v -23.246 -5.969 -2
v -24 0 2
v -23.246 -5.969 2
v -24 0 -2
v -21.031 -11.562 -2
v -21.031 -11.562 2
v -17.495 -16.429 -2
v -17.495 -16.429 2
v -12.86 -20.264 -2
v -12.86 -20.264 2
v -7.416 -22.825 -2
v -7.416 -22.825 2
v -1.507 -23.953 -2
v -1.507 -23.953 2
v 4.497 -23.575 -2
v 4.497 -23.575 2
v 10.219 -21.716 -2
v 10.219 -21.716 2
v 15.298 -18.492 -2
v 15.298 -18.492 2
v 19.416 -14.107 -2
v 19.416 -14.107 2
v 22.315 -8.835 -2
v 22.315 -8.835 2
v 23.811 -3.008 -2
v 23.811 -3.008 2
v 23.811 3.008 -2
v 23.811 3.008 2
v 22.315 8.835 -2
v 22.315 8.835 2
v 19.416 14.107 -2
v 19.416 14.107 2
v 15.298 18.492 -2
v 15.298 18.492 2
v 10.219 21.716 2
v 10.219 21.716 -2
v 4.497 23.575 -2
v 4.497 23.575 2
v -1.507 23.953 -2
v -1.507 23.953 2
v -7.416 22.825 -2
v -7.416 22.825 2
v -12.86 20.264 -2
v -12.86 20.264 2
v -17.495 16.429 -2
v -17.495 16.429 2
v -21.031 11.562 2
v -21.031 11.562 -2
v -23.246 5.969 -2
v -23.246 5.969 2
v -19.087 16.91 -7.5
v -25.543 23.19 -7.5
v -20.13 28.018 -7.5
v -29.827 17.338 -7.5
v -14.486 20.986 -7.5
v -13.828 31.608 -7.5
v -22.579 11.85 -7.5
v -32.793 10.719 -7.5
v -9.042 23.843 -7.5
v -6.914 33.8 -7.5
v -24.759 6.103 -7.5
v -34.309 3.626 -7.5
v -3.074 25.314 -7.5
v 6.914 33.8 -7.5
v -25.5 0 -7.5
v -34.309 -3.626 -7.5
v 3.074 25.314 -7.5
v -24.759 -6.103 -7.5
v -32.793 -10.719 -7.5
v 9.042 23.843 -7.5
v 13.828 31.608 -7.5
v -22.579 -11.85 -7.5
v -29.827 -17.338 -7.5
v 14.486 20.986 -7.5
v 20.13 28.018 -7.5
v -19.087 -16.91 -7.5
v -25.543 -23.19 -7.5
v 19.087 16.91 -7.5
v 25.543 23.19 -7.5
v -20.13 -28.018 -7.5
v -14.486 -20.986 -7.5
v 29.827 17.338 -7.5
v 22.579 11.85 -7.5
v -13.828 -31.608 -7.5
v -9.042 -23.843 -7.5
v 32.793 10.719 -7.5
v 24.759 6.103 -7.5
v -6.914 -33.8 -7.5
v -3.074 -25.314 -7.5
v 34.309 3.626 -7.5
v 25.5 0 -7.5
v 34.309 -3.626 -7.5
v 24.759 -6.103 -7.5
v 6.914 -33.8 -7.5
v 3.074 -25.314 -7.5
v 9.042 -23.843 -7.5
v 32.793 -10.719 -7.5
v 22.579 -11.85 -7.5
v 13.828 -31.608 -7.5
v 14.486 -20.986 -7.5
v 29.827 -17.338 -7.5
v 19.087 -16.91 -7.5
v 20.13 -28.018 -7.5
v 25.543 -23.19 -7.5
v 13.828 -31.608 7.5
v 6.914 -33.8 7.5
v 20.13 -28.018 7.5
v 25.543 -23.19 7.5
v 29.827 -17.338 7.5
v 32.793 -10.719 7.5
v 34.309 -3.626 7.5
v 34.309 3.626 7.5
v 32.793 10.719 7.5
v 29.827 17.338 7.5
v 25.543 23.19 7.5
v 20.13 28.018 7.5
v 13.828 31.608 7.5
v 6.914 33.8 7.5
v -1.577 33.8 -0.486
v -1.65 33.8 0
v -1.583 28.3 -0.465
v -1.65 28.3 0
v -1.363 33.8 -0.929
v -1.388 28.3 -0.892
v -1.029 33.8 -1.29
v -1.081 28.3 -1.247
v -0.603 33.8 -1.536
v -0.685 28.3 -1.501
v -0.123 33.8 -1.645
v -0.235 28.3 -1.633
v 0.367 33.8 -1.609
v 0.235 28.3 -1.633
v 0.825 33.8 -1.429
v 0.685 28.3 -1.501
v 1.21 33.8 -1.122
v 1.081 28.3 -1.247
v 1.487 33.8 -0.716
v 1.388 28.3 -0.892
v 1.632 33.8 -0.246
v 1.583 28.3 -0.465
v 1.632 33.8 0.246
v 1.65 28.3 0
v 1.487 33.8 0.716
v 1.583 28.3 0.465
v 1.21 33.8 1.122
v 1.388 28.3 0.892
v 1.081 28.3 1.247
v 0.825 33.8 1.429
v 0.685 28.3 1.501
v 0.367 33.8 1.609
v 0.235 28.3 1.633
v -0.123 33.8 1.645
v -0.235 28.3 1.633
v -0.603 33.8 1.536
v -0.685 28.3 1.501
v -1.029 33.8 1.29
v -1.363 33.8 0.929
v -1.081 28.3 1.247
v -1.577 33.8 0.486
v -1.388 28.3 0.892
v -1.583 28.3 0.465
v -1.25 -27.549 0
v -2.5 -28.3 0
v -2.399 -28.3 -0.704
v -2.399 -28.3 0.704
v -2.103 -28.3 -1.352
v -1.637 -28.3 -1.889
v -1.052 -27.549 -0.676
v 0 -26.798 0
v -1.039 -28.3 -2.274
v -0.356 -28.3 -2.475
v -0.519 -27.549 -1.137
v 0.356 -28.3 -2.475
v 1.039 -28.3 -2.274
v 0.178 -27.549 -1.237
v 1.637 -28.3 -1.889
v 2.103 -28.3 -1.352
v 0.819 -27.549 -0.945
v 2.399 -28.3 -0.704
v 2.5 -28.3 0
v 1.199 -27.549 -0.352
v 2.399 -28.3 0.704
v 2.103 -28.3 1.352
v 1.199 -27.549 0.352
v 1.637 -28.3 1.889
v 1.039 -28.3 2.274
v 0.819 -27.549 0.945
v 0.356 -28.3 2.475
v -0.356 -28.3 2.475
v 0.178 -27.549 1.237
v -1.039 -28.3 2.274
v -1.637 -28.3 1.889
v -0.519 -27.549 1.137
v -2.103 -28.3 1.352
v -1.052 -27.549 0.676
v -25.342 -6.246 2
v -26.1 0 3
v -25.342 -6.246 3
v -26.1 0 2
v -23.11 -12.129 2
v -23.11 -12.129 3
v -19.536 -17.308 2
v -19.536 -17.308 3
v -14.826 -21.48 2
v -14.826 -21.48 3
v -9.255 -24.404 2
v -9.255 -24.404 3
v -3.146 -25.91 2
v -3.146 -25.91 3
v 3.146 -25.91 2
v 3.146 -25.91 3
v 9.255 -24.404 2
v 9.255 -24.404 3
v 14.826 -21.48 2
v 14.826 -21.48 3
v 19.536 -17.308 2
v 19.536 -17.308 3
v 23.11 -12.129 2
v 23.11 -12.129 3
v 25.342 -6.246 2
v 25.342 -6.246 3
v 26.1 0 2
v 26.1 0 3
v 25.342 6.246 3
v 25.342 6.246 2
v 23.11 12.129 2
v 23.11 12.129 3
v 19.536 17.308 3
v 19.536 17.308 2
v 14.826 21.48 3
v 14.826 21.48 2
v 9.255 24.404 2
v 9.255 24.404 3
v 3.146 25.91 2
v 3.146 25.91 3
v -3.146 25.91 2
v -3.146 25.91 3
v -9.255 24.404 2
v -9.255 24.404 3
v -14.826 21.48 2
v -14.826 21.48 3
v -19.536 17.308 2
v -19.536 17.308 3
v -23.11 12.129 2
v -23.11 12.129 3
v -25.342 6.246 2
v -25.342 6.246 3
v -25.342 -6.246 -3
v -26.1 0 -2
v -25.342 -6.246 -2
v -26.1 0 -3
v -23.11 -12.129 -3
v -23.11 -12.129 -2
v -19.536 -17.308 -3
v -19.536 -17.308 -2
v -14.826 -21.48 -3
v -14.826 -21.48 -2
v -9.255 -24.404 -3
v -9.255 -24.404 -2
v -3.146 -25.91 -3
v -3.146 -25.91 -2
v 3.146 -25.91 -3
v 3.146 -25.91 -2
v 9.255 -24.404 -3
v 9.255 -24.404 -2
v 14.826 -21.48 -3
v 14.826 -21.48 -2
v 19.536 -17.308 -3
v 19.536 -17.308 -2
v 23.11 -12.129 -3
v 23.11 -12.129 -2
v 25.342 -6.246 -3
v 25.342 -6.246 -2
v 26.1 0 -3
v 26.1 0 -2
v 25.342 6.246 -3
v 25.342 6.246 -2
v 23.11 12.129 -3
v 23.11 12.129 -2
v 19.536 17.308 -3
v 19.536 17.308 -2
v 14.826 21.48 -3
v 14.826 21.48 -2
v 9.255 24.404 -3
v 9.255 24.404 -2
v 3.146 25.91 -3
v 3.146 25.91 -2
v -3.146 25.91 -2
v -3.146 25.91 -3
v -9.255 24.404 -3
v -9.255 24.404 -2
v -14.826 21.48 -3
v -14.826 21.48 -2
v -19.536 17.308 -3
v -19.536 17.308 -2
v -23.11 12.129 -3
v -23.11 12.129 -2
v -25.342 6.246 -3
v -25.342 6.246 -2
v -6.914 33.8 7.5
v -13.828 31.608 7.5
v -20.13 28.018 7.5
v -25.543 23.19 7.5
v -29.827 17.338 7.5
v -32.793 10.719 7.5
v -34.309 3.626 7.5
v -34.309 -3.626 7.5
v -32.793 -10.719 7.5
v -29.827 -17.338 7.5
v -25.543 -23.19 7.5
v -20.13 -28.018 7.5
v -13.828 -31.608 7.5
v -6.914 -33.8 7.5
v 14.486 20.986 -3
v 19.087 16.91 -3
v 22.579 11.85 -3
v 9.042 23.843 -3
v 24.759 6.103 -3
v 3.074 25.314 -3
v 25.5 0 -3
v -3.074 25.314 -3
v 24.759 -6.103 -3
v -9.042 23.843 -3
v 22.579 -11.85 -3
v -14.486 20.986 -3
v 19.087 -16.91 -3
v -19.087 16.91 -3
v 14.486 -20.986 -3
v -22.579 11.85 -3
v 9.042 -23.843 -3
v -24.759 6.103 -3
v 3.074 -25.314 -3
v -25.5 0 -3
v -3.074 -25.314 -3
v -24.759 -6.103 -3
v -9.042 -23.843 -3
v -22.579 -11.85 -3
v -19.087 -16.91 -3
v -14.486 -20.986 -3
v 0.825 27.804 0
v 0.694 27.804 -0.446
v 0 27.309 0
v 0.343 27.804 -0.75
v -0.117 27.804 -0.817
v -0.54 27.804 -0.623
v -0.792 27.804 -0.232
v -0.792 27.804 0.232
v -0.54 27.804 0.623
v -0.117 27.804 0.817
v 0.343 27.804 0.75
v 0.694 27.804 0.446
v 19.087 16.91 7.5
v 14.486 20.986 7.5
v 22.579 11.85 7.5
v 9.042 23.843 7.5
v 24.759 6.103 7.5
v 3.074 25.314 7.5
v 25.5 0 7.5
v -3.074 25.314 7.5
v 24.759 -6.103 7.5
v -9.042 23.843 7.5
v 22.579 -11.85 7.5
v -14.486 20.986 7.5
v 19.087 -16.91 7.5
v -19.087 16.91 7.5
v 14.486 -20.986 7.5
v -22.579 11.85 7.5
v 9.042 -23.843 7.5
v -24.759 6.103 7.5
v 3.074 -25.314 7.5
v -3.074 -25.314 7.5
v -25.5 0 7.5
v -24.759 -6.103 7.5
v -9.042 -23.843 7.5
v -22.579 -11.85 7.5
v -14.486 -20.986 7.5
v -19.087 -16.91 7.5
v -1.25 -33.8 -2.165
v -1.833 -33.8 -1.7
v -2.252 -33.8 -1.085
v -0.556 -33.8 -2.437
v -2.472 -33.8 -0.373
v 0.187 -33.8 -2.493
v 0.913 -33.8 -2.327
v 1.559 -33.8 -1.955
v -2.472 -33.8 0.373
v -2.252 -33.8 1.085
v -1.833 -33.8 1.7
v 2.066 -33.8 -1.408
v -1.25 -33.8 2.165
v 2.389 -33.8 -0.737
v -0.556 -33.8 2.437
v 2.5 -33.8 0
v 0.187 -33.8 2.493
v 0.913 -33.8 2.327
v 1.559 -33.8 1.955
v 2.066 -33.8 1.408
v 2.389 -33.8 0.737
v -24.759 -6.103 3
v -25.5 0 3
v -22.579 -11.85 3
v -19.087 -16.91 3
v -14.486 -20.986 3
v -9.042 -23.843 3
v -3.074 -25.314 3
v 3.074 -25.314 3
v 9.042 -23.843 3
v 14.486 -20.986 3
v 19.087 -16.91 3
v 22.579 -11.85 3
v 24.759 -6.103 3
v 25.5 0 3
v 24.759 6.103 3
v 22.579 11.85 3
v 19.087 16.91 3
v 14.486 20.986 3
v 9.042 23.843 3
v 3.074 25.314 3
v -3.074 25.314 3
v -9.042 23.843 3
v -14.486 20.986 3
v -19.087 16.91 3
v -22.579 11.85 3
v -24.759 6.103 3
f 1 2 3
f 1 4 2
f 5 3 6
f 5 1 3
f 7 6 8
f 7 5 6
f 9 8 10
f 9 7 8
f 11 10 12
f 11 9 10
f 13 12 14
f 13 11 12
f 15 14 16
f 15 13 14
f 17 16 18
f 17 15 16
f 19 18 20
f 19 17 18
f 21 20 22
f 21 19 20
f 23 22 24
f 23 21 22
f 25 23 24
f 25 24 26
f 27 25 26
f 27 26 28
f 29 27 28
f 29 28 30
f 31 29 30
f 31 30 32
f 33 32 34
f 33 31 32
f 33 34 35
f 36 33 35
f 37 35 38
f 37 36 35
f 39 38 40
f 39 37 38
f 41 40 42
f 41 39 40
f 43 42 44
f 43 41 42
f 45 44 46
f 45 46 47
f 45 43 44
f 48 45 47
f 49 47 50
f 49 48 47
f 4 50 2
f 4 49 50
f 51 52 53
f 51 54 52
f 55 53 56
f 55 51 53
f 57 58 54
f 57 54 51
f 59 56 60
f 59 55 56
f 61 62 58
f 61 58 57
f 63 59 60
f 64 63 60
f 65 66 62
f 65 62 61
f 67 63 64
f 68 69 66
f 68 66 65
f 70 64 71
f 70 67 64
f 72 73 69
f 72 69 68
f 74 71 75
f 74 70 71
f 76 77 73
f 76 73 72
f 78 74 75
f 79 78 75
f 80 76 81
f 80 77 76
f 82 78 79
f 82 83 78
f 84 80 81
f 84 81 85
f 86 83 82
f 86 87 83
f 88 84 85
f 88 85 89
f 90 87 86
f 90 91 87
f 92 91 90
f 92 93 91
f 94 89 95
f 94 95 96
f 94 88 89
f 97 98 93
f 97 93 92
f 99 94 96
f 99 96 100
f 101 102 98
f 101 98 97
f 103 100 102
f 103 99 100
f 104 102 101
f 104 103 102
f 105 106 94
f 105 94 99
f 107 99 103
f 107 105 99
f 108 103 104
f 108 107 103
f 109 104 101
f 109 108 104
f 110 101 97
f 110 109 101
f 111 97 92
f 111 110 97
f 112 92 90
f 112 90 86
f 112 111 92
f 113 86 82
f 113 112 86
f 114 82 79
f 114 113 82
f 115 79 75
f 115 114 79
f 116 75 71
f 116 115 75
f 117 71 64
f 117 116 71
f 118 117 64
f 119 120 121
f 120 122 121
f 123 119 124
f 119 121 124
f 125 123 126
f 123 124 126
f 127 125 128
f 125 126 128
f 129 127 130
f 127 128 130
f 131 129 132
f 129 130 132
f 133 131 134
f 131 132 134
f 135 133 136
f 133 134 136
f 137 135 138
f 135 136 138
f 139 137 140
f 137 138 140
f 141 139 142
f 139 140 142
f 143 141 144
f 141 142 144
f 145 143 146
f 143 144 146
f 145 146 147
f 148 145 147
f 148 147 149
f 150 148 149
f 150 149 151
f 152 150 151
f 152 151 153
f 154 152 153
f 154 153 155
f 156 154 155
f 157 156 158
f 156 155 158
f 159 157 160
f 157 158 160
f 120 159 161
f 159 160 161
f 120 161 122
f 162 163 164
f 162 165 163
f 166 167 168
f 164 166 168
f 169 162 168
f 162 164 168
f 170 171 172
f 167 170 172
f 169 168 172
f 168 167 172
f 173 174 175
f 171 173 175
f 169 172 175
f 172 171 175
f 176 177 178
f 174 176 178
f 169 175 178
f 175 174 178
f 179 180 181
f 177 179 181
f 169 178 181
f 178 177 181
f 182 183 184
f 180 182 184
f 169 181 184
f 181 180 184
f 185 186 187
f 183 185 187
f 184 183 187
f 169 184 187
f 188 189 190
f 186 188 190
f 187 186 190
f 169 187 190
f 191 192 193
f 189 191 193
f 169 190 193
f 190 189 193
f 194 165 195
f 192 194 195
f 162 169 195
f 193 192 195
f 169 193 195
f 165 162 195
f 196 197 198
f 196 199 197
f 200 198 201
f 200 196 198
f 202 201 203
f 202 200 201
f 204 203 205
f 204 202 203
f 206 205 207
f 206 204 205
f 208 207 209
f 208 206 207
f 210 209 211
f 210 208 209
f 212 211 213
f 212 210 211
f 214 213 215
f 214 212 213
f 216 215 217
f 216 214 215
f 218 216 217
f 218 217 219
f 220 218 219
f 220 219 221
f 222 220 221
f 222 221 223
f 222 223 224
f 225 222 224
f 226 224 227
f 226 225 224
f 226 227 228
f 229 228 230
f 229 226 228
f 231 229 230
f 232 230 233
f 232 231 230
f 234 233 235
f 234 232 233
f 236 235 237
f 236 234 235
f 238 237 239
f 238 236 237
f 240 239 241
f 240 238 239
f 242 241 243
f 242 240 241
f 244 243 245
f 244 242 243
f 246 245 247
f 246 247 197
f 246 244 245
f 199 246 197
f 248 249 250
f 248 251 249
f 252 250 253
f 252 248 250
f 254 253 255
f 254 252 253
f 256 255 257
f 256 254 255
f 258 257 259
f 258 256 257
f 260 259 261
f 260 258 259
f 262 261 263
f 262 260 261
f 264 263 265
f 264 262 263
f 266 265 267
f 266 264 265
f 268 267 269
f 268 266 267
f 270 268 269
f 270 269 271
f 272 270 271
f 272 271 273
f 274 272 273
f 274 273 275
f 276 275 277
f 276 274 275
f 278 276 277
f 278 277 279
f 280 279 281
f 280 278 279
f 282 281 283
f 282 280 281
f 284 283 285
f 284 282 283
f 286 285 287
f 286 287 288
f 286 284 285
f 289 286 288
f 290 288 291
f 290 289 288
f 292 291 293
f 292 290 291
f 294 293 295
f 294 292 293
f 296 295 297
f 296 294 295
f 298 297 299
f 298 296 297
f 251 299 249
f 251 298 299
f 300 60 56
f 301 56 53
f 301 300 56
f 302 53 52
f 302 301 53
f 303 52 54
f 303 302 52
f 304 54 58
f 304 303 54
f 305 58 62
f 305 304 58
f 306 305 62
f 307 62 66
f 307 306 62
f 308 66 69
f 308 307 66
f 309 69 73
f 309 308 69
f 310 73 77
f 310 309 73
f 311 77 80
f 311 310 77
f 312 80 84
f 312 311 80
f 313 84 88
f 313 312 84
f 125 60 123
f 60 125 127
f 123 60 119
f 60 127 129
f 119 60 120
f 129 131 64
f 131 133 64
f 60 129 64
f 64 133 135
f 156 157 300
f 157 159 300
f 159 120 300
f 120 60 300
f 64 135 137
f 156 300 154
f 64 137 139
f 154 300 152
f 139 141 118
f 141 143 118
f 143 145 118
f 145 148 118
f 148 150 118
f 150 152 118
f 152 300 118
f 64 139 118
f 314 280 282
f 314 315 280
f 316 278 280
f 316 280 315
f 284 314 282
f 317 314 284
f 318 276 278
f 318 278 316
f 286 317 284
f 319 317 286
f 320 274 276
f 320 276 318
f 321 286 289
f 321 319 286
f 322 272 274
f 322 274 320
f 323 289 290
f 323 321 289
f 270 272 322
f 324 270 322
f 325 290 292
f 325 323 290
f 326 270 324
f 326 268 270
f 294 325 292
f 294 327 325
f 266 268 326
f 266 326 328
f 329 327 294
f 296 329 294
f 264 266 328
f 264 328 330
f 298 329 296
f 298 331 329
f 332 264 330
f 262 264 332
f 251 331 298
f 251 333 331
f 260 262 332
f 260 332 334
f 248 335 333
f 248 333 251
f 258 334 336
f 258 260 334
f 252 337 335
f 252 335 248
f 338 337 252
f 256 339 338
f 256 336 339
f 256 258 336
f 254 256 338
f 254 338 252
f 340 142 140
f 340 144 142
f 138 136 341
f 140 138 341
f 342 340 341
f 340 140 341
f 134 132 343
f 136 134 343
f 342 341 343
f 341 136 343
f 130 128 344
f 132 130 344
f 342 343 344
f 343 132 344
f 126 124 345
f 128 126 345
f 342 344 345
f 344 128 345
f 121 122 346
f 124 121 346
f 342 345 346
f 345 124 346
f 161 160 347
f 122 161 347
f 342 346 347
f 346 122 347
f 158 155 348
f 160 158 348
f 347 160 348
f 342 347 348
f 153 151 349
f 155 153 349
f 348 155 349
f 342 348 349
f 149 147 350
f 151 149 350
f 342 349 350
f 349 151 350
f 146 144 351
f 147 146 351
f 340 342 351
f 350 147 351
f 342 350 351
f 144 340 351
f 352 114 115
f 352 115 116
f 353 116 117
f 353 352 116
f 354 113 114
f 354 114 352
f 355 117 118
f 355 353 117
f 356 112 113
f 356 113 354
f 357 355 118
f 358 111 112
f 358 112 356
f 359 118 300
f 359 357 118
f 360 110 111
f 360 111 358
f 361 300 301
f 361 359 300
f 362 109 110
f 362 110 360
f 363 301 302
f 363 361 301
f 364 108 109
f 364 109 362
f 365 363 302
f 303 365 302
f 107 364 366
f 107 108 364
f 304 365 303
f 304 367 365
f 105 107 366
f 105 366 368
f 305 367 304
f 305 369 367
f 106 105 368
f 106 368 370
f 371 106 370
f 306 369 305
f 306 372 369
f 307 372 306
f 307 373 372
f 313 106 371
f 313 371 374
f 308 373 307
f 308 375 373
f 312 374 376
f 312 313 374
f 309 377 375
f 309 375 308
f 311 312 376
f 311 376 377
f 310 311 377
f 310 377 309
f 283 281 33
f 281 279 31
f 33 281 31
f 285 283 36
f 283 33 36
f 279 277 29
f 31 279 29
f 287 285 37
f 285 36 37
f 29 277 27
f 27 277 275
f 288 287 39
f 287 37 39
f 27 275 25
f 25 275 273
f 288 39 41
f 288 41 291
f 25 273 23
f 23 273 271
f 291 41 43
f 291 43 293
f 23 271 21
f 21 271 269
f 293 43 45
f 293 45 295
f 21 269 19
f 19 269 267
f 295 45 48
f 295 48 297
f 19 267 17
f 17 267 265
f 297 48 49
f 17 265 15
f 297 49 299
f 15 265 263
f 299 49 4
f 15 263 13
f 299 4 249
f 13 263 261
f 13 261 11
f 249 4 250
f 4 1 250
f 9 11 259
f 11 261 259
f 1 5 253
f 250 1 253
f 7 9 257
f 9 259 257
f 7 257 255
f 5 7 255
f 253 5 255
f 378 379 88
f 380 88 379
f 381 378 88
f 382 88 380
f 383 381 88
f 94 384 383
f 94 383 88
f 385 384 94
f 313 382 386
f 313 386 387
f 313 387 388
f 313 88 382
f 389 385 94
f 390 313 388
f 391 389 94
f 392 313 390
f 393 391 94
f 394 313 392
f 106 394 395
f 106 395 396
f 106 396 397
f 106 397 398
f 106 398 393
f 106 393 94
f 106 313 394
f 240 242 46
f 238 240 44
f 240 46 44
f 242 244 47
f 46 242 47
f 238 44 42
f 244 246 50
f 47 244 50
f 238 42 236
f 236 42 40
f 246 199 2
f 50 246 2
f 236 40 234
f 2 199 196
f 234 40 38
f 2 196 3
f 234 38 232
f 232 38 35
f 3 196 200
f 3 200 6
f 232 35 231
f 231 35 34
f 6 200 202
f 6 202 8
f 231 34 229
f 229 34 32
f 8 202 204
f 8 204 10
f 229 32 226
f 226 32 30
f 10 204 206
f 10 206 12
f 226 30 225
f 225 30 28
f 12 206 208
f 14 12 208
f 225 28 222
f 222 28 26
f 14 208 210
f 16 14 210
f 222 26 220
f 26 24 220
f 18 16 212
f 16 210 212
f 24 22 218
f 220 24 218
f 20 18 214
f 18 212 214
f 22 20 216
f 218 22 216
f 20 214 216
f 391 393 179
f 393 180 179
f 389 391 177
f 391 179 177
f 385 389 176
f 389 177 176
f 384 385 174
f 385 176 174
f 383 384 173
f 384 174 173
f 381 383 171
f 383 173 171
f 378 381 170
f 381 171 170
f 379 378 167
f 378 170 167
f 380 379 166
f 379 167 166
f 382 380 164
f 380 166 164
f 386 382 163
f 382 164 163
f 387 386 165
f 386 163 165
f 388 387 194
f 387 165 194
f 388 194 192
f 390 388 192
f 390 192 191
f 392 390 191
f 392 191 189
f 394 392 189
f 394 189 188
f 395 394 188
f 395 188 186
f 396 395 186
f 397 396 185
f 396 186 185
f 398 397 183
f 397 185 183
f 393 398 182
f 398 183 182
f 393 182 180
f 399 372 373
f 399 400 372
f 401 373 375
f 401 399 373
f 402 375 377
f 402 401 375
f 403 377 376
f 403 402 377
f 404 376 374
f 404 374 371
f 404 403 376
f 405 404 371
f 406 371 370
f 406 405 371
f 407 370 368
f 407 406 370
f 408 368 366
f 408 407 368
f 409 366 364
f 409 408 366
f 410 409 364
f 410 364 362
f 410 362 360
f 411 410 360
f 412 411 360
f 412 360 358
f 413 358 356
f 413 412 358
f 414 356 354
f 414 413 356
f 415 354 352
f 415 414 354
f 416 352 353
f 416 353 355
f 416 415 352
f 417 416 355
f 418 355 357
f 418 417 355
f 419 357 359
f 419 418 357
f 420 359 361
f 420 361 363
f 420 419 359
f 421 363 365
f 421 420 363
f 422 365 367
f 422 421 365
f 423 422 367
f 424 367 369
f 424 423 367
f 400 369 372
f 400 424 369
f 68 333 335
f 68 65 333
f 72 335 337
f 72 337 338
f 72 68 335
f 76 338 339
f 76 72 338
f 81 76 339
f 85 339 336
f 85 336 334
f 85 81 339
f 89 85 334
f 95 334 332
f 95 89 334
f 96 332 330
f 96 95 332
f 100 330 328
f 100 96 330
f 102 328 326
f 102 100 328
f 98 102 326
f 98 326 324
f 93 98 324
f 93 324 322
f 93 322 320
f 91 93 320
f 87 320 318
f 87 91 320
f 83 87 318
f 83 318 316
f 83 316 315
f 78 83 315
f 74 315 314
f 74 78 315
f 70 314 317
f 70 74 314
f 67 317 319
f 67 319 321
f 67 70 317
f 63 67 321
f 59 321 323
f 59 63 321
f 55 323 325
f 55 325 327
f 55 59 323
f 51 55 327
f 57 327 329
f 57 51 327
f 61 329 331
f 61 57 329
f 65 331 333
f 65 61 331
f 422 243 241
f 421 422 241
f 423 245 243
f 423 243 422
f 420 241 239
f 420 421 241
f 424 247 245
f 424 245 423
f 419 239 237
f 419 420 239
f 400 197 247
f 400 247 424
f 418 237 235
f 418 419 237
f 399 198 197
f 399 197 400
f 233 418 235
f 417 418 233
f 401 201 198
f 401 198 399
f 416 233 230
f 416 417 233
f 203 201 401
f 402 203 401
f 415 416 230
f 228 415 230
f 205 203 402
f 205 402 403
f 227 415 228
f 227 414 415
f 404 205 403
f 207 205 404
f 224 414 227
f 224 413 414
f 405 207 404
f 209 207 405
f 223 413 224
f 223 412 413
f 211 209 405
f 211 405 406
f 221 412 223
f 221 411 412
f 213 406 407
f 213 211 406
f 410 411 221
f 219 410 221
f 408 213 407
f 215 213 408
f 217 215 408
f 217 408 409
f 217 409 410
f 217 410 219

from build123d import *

# Parameters (mm, degrees)
SKETCH_2_W             = 64.02174429
SKETCH_2_H             = 9.248919907
CUT_EXTRUDE_1_DEPTH    = 49
HOLE_WIZARD_M4_2_D     = 3.3
HOLE_WIZARD_M4_2_DEPTH = 5.5
HOLE_WIZARD_M4_2_TIP   = 0.991420021
HOLE_WIZARD_M6_2_D     = 5
HOLE_WIZARD_M6_2_DEPTH = 5.5
HOLE_WIZARD_M6_2_TIP   = 1.502151548


with BuildPart() as part:
    # 草图1 → 旋转1 (revolve)
    with BuildSketch(Plane(origin=(0, 0, 0), x_dir=(1, 0, 0), z_dir=(0, 1, 0)), mode=Mode.PRIVATE) as revolve_1_sk:
        Polygon((34.5, 7.5), (34.5, -7.5), (25.5, -7.5), (25.5, -3), (26.1, -3), (26.1, -2), (25.5, -2), (24, -2), (24, 2), (25.5, 2), (26.1, 2), (26.1, 3), (25.5, 3), (25.5, 7.5), align=None)
    revolve(revolve_1_sk.sketch.rotate(Axis((0, 0, -31.9390681), (0, 0, 1)), 180), axis=Axis((0, 0, -31.9390681), (0, 0, 1)))  # turned: the seam where the file's is

    # 草图2 → 切除-拉伸1 (cut)
    with BuildSketch(Plane.XY.offset(7.5)):
        with Locations((-1.141100508, 38.424459954)):
            Rectangle(SKETCH_2_W, SKETCH_2_H)
        with Locations((-1.141100508, -38.424459954)):
            Rectangle(SKETCH_2_W, SKETCH_2_H)
    extrude(amount=-CUT_EXTRUDE_1_DEPTH, mode=Mode.SUBTRACT)

    # M4 螺纹孔2
    with Locations(Plane(origin=(0, 33.8, 0), x_dir=(1, 0, 0), z_dir=(0, 1, 0))):
        with Locations((0, 0)):
            Hole(HOLE_WIZARD_M4_2_D / 2, depth=HOLE_WIZARD_M4_2_DEPTH)
            with Locations((0, 0, -(HOLE_WIZARD_M4_2_DEPTH + HOLE_WIZARD_M4_2_TIP / 2))):  # 118° drill point
                Cone(0, HOLE_WIZARD_M4_2_D / 2, HOLE_WIZARD_M4_2_TIP, mode=Mode.SUBTRACT)

    # M6 螺纹孔2
    with Locations(Plane(origin=(0, -33.8, 0), x_dir=(-1, 0, 0), z_dir=(0, -1, 0))):
        with Locations((0, 0)):
            Hole(HOLE_WIZARD_M6_2_D / 2, depth=HOLE_WIZARD_M6_2_DEPTH)
            with Locations((0, 0, -(HOLE_WIZARD_M6_2_DEPTH + HOLE_WIZARD_M6_2_TIP / 2))):  # 118° drill point
                Cone(0, HOLE_WIZARD_M6_2_D / 2, HOLE_WIZARD_M6_2_TIP, mode=Mode.SUBTRACT)


solid = part.part
